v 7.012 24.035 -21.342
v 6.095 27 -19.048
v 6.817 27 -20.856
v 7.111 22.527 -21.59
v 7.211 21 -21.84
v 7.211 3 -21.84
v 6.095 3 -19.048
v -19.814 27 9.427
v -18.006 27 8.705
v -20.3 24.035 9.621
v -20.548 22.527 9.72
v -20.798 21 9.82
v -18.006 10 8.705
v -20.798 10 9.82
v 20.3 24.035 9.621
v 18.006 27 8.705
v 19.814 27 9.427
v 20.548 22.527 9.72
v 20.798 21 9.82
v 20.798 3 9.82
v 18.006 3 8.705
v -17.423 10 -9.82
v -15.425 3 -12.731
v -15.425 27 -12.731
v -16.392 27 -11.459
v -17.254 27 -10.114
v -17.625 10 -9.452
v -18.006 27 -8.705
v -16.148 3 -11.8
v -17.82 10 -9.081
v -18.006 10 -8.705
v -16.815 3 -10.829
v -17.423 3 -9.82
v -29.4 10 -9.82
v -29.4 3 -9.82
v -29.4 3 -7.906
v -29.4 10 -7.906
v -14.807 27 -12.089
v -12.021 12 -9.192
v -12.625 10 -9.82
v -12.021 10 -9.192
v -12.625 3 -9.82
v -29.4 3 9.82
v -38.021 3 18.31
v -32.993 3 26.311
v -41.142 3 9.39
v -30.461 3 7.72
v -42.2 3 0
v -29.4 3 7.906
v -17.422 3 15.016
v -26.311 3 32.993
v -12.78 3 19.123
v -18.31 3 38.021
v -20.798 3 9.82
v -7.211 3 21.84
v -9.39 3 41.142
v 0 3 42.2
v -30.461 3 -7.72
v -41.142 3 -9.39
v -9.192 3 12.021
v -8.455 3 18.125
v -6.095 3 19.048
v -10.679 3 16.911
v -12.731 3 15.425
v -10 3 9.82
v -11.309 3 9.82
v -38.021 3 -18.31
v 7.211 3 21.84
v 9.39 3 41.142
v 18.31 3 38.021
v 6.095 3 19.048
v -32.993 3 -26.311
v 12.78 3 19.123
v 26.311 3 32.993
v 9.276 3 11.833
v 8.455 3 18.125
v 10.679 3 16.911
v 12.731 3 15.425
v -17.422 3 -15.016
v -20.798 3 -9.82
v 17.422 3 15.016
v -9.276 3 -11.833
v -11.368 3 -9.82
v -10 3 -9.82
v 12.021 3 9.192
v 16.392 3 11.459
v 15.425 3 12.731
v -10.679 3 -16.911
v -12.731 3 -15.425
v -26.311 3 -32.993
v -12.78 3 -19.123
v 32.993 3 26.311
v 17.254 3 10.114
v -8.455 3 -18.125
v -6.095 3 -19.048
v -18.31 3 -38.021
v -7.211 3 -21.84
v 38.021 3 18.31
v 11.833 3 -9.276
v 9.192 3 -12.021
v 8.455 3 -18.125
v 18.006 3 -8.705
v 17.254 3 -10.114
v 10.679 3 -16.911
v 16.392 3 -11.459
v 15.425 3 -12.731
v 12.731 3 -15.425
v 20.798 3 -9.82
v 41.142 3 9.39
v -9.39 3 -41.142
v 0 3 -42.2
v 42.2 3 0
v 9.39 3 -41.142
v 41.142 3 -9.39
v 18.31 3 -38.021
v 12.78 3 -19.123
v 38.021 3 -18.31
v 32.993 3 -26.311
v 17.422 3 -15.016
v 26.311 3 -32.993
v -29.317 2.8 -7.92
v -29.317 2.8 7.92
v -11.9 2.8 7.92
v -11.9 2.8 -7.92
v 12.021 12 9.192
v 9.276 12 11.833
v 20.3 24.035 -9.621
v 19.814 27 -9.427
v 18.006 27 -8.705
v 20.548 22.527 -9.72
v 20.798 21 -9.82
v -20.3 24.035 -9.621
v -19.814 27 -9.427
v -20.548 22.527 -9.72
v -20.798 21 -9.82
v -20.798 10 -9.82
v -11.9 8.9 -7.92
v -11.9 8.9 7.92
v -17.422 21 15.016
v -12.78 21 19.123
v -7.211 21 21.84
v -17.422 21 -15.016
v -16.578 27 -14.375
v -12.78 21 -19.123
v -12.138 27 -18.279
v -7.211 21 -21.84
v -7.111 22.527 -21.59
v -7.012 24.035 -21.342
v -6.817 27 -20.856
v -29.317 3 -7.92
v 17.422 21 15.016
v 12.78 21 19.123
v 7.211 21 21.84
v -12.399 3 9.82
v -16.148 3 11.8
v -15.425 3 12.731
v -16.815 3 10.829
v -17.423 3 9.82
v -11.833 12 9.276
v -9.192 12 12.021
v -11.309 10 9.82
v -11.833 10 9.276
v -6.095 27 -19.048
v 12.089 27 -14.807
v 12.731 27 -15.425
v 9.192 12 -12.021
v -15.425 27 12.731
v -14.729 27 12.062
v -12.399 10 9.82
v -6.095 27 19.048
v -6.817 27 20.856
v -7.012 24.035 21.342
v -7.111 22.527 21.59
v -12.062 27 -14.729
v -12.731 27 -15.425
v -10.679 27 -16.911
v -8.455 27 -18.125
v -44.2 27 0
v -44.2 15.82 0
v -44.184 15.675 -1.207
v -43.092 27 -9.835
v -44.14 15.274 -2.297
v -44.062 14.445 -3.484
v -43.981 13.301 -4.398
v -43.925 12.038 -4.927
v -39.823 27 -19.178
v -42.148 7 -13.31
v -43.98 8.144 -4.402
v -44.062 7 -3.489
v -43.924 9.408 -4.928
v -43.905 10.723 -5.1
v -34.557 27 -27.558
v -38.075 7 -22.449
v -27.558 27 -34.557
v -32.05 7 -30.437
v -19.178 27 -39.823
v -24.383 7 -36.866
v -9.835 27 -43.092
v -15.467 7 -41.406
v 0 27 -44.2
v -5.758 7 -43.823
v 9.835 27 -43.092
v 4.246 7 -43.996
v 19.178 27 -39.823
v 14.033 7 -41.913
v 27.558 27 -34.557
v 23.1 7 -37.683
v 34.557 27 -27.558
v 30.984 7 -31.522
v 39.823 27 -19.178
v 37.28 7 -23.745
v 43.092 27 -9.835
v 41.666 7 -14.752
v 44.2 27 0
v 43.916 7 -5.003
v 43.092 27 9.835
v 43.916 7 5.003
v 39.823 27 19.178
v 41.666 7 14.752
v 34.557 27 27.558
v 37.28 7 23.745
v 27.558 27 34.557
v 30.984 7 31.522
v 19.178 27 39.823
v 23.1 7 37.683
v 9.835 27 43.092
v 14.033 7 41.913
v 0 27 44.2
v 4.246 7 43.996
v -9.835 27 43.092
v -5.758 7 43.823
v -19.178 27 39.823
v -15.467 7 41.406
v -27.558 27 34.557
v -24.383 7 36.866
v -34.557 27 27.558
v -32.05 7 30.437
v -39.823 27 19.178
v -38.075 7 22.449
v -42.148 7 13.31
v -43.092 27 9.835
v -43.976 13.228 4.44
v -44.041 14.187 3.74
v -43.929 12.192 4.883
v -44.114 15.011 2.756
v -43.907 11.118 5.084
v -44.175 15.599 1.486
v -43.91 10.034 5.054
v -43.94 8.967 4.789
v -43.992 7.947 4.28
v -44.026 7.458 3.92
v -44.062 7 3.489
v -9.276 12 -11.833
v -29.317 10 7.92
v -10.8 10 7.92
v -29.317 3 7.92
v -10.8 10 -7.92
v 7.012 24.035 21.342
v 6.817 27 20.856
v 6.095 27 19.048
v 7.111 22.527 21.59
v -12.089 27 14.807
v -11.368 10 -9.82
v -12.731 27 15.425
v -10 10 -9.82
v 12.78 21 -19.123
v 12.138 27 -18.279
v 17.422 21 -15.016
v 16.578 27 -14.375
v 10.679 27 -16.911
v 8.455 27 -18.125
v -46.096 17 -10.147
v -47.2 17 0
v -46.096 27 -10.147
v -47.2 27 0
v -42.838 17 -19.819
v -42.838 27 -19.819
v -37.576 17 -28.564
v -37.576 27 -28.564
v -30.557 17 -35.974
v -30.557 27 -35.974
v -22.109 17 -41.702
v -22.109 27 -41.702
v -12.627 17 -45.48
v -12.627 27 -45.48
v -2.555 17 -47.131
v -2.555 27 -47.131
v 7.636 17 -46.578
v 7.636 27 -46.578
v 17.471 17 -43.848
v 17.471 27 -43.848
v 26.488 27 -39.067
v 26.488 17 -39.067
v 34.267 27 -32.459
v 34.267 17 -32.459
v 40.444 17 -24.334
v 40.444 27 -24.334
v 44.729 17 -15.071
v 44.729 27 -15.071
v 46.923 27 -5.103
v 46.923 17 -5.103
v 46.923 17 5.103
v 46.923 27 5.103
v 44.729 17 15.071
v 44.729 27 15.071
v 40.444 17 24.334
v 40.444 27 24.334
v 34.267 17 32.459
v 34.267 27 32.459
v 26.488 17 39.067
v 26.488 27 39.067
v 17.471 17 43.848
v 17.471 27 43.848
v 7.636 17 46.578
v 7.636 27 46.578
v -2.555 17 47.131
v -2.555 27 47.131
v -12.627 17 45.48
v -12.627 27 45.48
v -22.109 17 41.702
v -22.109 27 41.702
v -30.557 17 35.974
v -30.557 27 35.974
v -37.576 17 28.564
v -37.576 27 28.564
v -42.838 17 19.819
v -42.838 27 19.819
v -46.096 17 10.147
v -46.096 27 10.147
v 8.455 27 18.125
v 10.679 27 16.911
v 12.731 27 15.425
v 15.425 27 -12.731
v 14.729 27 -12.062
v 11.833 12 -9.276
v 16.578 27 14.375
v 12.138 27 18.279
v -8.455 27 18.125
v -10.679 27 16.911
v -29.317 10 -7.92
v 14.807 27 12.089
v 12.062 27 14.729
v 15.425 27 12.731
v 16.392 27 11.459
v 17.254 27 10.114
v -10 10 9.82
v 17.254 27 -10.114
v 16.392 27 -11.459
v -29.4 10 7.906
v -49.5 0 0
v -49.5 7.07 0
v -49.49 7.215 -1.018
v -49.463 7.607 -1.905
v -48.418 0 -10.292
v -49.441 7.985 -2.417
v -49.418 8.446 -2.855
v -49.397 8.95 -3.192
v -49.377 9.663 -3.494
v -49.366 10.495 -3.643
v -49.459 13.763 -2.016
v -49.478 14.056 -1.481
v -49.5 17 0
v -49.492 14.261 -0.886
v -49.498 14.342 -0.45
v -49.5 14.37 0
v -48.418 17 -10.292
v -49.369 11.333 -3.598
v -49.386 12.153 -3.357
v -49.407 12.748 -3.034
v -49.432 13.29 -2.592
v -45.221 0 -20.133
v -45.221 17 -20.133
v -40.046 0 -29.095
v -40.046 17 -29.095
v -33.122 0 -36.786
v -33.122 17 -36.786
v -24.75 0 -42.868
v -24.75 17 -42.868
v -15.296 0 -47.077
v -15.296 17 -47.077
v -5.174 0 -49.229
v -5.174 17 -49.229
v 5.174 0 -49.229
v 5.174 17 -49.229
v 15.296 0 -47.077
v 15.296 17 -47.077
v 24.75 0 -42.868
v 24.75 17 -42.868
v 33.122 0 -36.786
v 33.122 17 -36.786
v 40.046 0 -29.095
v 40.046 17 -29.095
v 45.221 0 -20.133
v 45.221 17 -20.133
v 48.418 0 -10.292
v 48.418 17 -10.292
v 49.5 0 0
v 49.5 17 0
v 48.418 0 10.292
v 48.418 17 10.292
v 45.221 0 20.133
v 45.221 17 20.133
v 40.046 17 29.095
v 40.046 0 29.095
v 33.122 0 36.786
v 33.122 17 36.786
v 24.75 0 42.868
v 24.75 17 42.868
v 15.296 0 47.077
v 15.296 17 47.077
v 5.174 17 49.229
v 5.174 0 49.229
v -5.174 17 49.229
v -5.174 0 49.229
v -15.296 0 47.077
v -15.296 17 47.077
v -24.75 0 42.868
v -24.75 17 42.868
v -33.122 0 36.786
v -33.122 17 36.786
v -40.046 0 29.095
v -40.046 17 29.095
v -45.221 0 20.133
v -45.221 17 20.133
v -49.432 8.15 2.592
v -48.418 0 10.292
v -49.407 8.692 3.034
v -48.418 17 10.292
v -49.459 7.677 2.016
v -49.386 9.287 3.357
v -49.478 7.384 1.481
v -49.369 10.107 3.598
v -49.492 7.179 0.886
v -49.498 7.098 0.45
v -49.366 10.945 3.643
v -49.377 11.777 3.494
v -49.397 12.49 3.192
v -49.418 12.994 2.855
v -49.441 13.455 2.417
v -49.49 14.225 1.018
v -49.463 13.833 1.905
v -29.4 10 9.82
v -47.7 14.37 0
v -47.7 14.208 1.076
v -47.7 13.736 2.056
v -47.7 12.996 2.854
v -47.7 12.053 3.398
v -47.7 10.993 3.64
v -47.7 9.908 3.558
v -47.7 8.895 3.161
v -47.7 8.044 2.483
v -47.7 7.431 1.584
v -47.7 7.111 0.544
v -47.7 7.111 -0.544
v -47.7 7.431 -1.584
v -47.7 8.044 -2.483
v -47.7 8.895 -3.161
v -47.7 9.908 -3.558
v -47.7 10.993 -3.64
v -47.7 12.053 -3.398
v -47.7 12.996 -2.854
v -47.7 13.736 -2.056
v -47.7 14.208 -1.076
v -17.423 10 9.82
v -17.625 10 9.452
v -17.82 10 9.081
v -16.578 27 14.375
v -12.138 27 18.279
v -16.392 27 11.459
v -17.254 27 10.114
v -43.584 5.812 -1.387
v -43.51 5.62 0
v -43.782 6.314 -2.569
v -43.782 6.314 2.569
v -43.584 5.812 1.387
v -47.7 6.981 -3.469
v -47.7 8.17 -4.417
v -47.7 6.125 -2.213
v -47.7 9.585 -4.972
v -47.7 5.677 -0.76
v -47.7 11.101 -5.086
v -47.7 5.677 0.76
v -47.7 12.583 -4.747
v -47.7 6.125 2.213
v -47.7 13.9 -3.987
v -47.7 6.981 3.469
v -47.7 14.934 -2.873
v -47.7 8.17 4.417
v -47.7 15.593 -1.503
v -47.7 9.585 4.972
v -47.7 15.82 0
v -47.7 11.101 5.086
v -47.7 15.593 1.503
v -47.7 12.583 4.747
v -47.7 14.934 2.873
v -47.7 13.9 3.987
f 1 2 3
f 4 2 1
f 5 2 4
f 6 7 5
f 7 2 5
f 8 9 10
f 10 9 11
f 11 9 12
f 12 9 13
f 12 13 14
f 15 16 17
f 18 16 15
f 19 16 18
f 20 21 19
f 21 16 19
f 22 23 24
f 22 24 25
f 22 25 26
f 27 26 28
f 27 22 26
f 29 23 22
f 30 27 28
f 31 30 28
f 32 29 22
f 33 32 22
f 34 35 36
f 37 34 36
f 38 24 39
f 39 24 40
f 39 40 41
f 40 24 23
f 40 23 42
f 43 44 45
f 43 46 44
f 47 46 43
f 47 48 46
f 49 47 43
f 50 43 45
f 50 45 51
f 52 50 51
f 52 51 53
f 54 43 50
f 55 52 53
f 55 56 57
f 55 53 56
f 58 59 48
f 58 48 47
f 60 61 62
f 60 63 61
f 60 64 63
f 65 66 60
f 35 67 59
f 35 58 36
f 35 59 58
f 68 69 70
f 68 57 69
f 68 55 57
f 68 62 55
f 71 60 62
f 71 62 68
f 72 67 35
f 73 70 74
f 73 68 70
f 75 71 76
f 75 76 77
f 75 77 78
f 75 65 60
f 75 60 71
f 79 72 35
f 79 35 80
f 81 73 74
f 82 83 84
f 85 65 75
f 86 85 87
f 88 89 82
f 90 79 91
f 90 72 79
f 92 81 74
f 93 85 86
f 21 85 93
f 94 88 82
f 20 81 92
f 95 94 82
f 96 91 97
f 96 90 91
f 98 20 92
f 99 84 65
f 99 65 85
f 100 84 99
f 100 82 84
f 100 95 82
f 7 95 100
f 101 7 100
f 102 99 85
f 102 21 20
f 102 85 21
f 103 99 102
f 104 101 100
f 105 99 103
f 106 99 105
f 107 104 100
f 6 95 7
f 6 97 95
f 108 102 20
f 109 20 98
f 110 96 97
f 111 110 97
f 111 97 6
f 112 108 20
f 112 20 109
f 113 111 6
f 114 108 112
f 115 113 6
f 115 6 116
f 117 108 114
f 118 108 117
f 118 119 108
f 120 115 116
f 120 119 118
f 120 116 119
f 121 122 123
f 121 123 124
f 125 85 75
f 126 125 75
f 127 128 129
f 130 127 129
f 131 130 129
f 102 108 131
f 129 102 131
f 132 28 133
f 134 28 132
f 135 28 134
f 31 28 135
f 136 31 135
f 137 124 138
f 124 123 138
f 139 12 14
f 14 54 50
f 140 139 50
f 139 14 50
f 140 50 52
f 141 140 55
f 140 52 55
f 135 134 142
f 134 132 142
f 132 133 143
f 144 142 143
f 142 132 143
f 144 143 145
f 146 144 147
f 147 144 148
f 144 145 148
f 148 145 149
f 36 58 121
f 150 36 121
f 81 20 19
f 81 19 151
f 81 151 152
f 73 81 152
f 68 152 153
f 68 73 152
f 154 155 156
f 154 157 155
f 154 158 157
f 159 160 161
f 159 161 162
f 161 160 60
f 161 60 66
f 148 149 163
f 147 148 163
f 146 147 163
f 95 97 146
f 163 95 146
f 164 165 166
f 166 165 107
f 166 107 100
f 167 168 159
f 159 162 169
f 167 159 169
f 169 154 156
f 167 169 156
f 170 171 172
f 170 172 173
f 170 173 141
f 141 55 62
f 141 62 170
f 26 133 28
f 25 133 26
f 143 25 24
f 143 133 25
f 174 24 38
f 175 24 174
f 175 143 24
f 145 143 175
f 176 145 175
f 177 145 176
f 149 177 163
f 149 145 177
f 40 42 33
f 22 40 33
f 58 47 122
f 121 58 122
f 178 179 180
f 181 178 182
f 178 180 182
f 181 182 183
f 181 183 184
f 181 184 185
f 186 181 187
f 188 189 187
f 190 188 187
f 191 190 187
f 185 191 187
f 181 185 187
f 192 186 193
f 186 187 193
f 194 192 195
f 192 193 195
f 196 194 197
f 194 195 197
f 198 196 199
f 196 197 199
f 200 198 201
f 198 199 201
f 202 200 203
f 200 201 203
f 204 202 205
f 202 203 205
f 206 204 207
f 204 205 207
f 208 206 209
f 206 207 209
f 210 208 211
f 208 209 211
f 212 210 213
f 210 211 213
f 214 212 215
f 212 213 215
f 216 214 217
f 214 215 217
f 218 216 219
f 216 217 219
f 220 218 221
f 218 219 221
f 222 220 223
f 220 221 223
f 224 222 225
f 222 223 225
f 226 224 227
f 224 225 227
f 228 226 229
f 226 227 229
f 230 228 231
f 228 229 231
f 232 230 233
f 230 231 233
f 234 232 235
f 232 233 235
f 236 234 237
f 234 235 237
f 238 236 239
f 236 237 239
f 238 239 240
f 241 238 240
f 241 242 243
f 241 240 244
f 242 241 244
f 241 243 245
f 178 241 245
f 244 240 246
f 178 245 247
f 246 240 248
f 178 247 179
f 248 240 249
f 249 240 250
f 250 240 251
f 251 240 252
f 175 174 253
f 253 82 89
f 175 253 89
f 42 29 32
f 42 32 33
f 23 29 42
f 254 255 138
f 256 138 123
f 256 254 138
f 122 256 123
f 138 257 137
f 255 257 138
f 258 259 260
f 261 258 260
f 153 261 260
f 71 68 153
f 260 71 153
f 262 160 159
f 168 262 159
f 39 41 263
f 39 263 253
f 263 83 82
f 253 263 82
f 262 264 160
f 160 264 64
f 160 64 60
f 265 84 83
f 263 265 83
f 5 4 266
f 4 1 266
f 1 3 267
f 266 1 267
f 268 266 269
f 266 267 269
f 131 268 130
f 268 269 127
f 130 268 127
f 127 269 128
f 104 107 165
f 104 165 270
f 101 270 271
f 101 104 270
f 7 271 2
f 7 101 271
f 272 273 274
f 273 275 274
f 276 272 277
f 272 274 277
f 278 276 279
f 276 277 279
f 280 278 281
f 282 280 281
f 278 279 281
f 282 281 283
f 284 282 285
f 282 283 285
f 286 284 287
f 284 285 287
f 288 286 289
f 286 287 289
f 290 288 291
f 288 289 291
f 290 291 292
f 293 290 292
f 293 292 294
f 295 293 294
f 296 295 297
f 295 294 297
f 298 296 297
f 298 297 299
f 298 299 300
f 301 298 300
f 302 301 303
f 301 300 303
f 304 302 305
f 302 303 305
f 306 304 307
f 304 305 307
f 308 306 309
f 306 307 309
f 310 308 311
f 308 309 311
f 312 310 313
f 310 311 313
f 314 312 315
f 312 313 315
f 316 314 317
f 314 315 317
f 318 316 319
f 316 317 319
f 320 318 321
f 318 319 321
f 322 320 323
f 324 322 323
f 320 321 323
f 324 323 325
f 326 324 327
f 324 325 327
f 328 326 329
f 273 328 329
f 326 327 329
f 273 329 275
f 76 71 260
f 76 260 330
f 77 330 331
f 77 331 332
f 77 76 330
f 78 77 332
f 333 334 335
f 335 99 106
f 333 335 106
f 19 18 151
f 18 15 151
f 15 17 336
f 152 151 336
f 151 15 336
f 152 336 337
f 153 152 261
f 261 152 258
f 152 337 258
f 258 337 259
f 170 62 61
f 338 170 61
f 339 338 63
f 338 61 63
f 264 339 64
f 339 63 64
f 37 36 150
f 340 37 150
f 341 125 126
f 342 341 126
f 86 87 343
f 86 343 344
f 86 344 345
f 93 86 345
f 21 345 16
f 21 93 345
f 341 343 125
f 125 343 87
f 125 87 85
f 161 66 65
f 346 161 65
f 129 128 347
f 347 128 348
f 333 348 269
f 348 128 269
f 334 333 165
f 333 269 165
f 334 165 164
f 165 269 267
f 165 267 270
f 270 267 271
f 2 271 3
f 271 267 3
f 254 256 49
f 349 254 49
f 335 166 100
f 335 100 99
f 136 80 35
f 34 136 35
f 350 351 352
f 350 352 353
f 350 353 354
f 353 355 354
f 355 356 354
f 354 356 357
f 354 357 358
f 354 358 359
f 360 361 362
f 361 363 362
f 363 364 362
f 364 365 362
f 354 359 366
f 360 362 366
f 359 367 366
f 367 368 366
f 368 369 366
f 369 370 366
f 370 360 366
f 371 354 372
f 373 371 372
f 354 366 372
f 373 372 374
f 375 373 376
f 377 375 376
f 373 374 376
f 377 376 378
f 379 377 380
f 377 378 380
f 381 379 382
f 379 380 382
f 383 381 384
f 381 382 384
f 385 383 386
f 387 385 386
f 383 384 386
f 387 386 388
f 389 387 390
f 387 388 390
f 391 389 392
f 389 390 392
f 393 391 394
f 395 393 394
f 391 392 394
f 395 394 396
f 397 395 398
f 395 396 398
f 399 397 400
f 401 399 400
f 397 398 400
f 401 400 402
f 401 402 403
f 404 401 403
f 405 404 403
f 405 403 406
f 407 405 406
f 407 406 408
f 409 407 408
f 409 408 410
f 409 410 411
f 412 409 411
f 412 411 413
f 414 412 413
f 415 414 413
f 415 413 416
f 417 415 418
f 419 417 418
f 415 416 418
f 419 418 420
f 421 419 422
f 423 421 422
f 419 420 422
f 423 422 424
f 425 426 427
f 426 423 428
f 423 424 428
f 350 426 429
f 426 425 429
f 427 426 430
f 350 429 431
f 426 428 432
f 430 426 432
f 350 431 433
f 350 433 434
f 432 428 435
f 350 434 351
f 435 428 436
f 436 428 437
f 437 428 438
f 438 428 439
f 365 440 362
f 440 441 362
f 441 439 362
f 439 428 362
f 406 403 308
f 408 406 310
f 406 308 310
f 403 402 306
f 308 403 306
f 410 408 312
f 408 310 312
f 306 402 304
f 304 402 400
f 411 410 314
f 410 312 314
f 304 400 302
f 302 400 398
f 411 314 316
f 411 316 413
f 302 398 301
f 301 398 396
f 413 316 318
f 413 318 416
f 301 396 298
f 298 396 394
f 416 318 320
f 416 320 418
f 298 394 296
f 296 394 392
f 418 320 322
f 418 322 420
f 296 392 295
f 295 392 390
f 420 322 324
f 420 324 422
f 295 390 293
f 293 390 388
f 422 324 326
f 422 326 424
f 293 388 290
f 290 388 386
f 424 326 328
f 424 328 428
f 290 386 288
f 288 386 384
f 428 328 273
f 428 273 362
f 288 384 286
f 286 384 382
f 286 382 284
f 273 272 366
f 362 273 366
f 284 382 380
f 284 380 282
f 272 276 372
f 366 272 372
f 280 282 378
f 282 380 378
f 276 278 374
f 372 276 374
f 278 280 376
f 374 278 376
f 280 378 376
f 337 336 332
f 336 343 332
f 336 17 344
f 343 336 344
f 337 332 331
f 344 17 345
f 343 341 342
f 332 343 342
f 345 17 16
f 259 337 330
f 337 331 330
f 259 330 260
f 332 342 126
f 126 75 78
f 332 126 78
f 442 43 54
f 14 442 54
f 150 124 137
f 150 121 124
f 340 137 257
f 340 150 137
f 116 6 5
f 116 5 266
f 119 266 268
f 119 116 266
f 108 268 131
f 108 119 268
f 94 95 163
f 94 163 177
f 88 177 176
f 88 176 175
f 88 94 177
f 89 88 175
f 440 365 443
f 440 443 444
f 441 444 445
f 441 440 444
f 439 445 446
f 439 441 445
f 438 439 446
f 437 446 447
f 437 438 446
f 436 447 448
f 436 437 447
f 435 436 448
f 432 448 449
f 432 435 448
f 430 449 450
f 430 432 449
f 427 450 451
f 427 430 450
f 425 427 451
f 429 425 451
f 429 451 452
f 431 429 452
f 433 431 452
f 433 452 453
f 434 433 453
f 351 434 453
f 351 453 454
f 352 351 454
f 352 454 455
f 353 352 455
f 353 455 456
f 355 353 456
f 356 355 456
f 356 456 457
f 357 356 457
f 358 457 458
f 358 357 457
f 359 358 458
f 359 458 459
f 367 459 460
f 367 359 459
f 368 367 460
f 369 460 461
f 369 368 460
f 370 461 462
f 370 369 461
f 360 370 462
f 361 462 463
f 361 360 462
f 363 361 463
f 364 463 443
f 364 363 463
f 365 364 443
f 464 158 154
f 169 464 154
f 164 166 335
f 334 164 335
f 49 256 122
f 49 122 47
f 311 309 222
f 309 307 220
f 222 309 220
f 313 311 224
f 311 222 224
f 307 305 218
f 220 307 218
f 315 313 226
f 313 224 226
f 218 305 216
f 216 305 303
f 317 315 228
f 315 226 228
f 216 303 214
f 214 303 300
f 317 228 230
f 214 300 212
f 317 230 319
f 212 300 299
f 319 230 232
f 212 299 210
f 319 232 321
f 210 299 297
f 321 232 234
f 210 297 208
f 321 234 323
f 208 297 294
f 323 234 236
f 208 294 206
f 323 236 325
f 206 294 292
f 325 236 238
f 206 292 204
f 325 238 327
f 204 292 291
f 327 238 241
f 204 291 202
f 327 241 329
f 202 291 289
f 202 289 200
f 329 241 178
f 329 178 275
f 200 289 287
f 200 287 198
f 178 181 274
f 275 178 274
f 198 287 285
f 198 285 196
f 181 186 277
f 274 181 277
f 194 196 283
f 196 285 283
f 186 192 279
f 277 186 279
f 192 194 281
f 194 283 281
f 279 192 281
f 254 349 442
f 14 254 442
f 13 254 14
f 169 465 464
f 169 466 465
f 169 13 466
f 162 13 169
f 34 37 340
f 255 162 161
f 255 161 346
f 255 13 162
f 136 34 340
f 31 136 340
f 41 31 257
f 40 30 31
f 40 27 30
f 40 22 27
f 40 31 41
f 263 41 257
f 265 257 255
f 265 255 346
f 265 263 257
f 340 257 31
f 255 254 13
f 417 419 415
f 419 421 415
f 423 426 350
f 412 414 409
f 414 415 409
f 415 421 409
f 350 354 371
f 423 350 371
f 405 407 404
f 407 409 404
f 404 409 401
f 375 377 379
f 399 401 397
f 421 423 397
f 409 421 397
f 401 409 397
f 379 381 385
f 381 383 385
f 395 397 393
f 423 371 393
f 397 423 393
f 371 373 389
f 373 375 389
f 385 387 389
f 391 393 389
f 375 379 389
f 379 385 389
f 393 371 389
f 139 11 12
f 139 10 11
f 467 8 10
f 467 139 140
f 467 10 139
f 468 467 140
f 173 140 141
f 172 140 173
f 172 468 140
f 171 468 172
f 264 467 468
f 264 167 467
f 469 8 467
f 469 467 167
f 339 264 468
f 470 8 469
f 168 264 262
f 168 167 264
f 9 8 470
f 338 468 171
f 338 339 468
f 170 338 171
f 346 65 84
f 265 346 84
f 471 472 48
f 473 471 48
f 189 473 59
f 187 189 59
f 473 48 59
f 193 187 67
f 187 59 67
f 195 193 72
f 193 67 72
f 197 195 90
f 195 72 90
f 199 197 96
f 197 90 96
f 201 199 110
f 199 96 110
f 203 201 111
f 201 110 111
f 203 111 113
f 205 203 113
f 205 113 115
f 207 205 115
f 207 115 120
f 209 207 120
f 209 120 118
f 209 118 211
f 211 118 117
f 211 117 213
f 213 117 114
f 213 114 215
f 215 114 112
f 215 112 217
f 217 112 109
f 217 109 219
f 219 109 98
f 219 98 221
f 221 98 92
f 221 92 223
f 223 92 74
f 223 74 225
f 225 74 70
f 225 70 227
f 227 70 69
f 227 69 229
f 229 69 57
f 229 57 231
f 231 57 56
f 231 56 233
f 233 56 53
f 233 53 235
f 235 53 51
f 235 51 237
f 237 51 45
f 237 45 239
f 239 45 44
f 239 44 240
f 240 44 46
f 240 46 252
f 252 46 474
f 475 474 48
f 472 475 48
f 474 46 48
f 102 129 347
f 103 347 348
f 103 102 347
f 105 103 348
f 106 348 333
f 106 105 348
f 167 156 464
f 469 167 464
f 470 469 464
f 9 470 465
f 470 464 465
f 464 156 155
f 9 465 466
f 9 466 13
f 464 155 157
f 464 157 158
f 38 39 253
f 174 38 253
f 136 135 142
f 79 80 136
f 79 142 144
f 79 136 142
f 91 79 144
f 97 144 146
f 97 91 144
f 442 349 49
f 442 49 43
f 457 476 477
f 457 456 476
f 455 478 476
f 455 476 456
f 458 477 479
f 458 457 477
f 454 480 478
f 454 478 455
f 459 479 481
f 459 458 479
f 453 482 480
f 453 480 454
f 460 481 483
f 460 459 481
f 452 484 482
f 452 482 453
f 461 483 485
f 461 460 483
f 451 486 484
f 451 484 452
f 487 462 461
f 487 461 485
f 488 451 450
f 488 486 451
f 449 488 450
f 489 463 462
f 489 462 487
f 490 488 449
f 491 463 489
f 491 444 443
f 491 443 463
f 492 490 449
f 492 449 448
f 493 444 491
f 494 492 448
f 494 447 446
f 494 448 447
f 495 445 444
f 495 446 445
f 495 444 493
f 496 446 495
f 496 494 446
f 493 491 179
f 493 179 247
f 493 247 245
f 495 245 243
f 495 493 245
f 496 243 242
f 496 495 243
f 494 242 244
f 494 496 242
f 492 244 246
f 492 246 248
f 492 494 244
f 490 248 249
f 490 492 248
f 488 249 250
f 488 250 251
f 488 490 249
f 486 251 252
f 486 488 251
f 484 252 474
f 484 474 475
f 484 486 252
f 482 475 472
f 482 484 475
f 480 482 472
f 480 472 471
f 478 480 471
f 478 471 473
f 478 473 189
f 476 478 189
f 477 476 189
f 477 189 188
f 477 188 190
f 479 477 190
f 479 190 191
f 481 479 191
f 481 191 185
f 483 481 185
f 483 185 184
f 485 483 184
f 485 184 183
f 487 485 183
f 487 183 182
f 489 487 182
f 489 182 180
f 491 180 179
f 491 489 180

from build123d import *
from OCP.BRepFilletAPI import BRepFilletAPI_MakeChamfer

# Parameters (mm, degrees)
EXTRUDE_1_DEPTH     = 7
OTHER_START         = -47.7
OTHER_1_OUTLINE_R   = 5.1
OTHER_1_DEPTH       = 35.8
OTHER_START_2       = -30.461492928
OTHER_1_2_DEPTH     = 18.561492928
OTHER_START_3       = -51
OTHER_1_3_OUTLINE_R = 3.65
OTHER_1_3_DEPTH     = 3.3
OTHER_START_4       = 2
OTHER_1_4_DEPTH     = 1
OTHER_START_5       = 2.8
OTHER_1_5_DEPTH     = 7.2
OTHER_START_6       = -3
OTHER_1_6_DEPTH     = 0.709959236
EXTRUDE_2_DEPTH     = 24
EXTRUDE_2_2_DEPTH   = 24
EXTRUDE_2_3_DEPTH   = 24
EXTRUDE_2_4_DEPTH   = 24
CHAMFER_1_SIZE      = 6
CHAMFER_1_SIZE2     = 1.057961884
CHAMFER_2_SIZE      = 6
CHAMFER_2_SIZE2     = 1.057961884
CHAMFER_3_SIZE      = 6
CHAMFER_3_SIZE2     = 1.057961884
CHAMFER_4_SIZE      = 6
CHAMFER_4_SIZE2     = 1.057961884
CHAMFER_5_SIZE      = 1.1
EXTRUDE_3_DEPTH     = 24
CHAMFER_6_SIZE      = 15
CHAMFER_6_SIZE2     = 4.019237886


with BuildPart() as part:
    # Эскиз1 → Повернуть1 (revolve)
    with BuildSketch(Plane.XY):
        Polygon((0, 0), (-49.5, 0), (-49.5, 17), (-47.2, 17), (-47.2, 27), (-44.2, 27), (-44.2, 7), (-42.2, 3), (0, 3), align=None)
    revolve(axis=Axis((0, 3, 0), (0, -1, 0)))

    # Эскиз2 → Бобышка-Вытянуть1 (add)
    with BuildSketch(Plane(origin=(0, 3, 0), x_dir=(1, 0, 0), z_dir=(0, 1, 0))):
        Polygon((-10, -9.82), (-10, 9.82), (-29.4, 9.82), (-29.4, 7.82), (-12, 7.82), (-12, -7.82), (-29.4, -7.82), (-29.4, -9.82), align=None)
    extrude(amount=EXTRUDE_1_DEPTH)

    # Отступ1: read off the stored shape, not the designer's step
    # Отступ1 outline → Отступ1 (cut)
    with BuildSketch(Plane.YZ.offset(OTHER_START)):
        with Locations((10.72, 0)):
            Circle(OTHER_1_OUTLINE_R)
    extrude(amount=OTHER_1_DEPTH, mode=Mode.SUBTRACT)

    # Other 1 2 outline → Other 1 2 (cut)
    with BuildSketch(Plane.YZ.offset(OTHER_START_2)):
        with BuildLine():
            Line((2.8, 7.92), (2.8, -7.92))
            Line((2.8, -7.92), (10, -7.92))
            Line((10, -7.92), (10, -5.048920677))
            ThreePointArc((10, -5.048920677), (5.62, 0), (10, 5.048920677))
            Line((10, 5.048920677), (10, 7.92))
            Line((10, 7.92), (2.8, 7.92))
        make_face()
    extrude(amount=OTHER_1_2_DEPTH, mode=Mode.SUBTRACT)

    # Other 1 3 outline → Other 1 3 (cut)
    with BuildSketch(Plane.YZ.offset(OTHER_START_3)):
        with Locations((10.72, 0)):
            Circle(OTHER_1_3_OUTLINE_R)
    extrude(amount=OTHER_1_3_DEPTH, mode=Mode.SUBTRACT)

    # Other 1 4 outline → Other 1 4 (add)
    with BuildSketch(Plane(origin=(0, 0, 0), x_dir=(1, 0, 0), z_dir=(0, 1, 0)).offset(OTHER_START_4)):
        Polygon((-30.461492928, -7.72), (-30.461492928, -7.92), (-29.317348784, -7.92), align=None)
        Polygon((-30.461492928, 7.92), (-30.461492928, 7.72), (-29.317348784, 7.92), align=None)
    extrude(amount=OTHER_1_4_DEPTH)

    # Other 1 5 outline → Other 1 5 (add)
    with BuildSketch(Plane(origin=(0, 0, 0), x_dir=(1, 0, 0), z_dir=(0, 1, 0)).offset(OTHER_START_5)):
        Polygon((-29.317348784, -7.92), (-29.4, -7.905552307), (-29.4, -7.92), align=None)
        Polygon((-29.4, 7.92), (-29.4, 7.905552307), (-29.317348784, 7.92), align=None)
    extrude(amount=OTHER_1_5_DEPTH)

    # Other 1 6 outline → Other 1 6 (add)
    with BuildSketch(Plane(origin=(0, 0, 0), x_dir=(0.9850633751005737, -0.17219218052939098, 0), z_dir=(0.17219218052939098, 0.9850633751005737, 0)).offset(OTHER_START_6)):
        Polygon((-29.361584648, 7.92), (-30.523077576, 7.72), (-30.523077576, -7.72), (-29.361584648, -7.92), align=None)
    extrude(amount=OTHER_1_6_DEPTH)

    # Фаска5
    chamfer_5_edges = [part.edges().sort_by_distance(p)[0] for p in [
        (-11.9, 10, 0),
    ]]
    chamfer(chamfer_5_edges, length=CHAMFER_5_SIZE)



with BuildPart() as body_2:
    # Эскиз4 → Бобышка-Вытянуть2 (new body)
    with BuildSketch(Plane(origin=(0, 3, 0), x_dir=(1, 0, 0), z_dir=(0, 1, 0))):
        with BuildLine():
            Line((-18.006273941, 8.704831921), (-20.798259543, 9.82))
            ThreePointArc((-20.798259543, 9.82), (-15.239680095, 17.226495598), (-7.210659701, 21.84047588))
            Line((-7.210659701, 21.84047588), (-6.095491622, 19.048490278))
            ThreePointArc((-6.095491622, 19.048490278), (-13.113793992, 15.100609496), (-18.006273941, 8.704831921))
        make_face()
    extrude(amount=EXTRUDE_2_DEPTH)

    # Фаска4
    chamfer_4_edges = [body_2.edges().sort_by_distance(p)[0] for p in [
        (-15.239680095, 27, -17.226495598),
    ]]
    chamfer_4_side = [body_2.faces().sort_by_distance(p)[0] for p in [
        (-15.239680095, 15, -17.226495598),
    ]]
    chamfer(chamfer_4_edges, length=CHAMFER_4_SIZE, length2=CHAMFER_4_SIZE2, reference=chamfer_4_side[0])


with BuildPart() as body_3:
    # Эскиз4 → Extrude 2 2 (new body)
    with BuildSketch(Plane(origin=(0, 3, 0), x_dir=(1, 0, 0), z_dir=(0, 1, 0))):
        with BuildLine():
            Line((-18.006273941, -8.704831921), (-20.798259543, -9.82))
            ThreePointArc((-20.798259543, -9.82), (-15.239680095, -17.226495598), (-7.210659701, -21.84047588))
            Line((-7.210659701, -21.84047588), (-6.095491622, -19.048490278))
            ThreePointArc((-6.095491622, -19.048490278), (-13.113793992, -15.100609496), (-18.006273941, -8.704831921))
        make_face()
    extrude(amount=EXTRUDE_2_2_DEPTH)

    # Фаска1
    chamfer_1_edges = [body_3.edges().sort_by_distance(p)[0] for p in [
        (-15.239680095, 27, 17.226495598),
    ]]
    chamfer_1_side = [body_3.faces().sort_by_distance(p)[0] for p in [
        (-15.239680095, 15, 17.226495598),
    ]]
    chamfer(chamfer_1_edges, length=CHAMFER_1_SIZE, length2=CHAMFER_1_SIZE2, reference=chamfer_1_side[0])


with BuildPart() as body_4:
    # Эскиз4 → Extrude 2 3 (new body)
    with BuildSketch(Plane(origin=(0, 3, 0), x_dir=(1, 0, 0), z_dir=(0, 1, 0))):
        with BuildLine():
            Line((6.095491622, 19.048490278), (7.210659701, 21.84047588))
            ThreePointArc((7.210659701, 21.84047588), (15.239680095, 17.226495598), (20.798259543, 9.82))
            Line((20.798259543, 9.82), (18.006273941, 8.704831921))
            ThreePointArc((18.006273941, 8.704831921), (13.113793992, 15.100609496), (6.095491622, 19.048490278))
        make_face()
    extrude(amount=EXTRUDE_2_3_DEPTH)

    # Фаска3
    chamfer_3_edges = [body_4.edges().sort_by_distance(p)[0] for p in [
        (15.239680095, 27, -17.226495598),
    ]]
    chamfer_3_side = [body_4.faces().sort_by_distance(p)[0] for p in [
        (15.239680095, 15, -17.226495598),
    ]]
    chamfer(chamfer_3_edges, length=CHAMFER_3_SIZE, length2=CHAMFER_3_SIZE2, reference=chamfer_3_side[0])


with BuildPart() as body_5:
    # Эскиз4 → Extrude 2 4 (new body)
    with BuildSketch(Plane(origin=(0, 3, 0), x_dir=(1, 0, 0), z_dir=(0, 1, 0))):
        with BuildLine():
            Line((18.006273941, -8.704831921), (20.798259543, -9.82))
            ThreePointArc((20.798259543, -9.82), (15.239680095, -17.226495598), (7.210659701, -21.84047588))
            Line((7.210659701, -21.84047588), (6.095491622, -19.048490278))
            ThreePointArc((6.095491622, -19.048490278), (13.113793992, -15.100609496), (18.006273941, -8.704831921))
        make_face()
    extrude(amount=EXTRUDE_2_4_DEPTH)

    # Фаска2
    chamfer_2_edges = [body_5.edges().sort_by_distance(p)[0] for p in [
        (15.239680095, 27, 17.226495598),
    ]]
    chamfer_2_side = [body_5.faces().sort_by_distance(p)[0] for p in [
        (15.239680095, 15, 17.226495598),
    ]]
    chamfer(chamfer_2_edges, length=CHAMFER_2_SIZE, length2=CHAMFER_2_SIZE2, reference=chamfer_2_side[0])


with BuildPart() as part_1:
    add(part.part)

    add(body_2.part)  # Бобышка-Вытянуть3 merges body 2

    add(body_3.part)  # Бобышка-Вытянуть3 merges body 3

    add(body_4.part)  # Бобышка-Вытянуть3 merges body 4

    add(body_5.part)  # Бобышка-Вытянуть3 merges body 5
    # Эскиз5 → Бобышка-Вытянуть3 (add)
    with BuildSketch(Plane(origin=(0, 3, 0), x_dir=(1, 0, 0), z_dir=(0, 1, 0))):
        with BuildLine():
            Line((-9.275848781, 11.832874951), (-12.730982797, 15.424722916))
            ThreePointArc((-12.730982797, 15.424722916), (-14.142135624, 14.142135624), (-15.424722916, 12.730982797))
            Line((-15.424722916, 12.730982797), (-12.02081528, 9.192388155))
            Line((-12.02081528, 9.192388155), (-9.275848781, 11.832874951))
        make_face()
        with BuildLine():
            ThreePointArc((15.424722916, 12.730982797), (14.142135624, 14.142135624), (12.730982797, 15.424722916))
            Line((12.730982797, 15.424722916), (9.192388155, 12.02081528))
            Line((9.192388155, 12.02081528), (11.832874951, 9.275848781))
            Line((11.832874951, 9.275848781), (15.424722916, 12.730982797))
        make_face()
        with BuildLine():
            ThreePointArc((12.730982797, -15.424722916), (14.142135624, -14.142135624), (15.424722916, -12.730982797))
            Line((15.424722916, -12.730982797), (12.02081528, -9.192388155))
            Line((12.02081528, -9.192388155), (9.275848781, -11.832874951))
            Line((9.275848781, -11.832874951), (12.730982797, -15.424722916))
        make_face()
        with BuildLine():
            ThreePointArc((-15.424722916, -12.730982797), (-14.142135624, -14.142135624), (-12.730982797, -15.424722916))
            Line((-12.730982797, -15.424722916), (-9.192388155, -12.02081528))
            Line((-9.192388155, -12.02081528), (-11.832874951, -9.275848781))
            Line((-11.832874951, -9.275848781), (-15.424722916, -12.730982797))
        make_face()
    extrude(amount=EXTRUDE_3_DEPTH)

    # Фаска6: one chamfer whose edges measure the first distance from different faces: ONE call of the kernel's chamfer builder (chamfer() names one face for all edges)
    chamfer_6_edges_1 = [part_1.edges().sort_by_distance(p)[0] for p in [
        (-10.648332031, 27, -10.512631553),
    ]]
    chamfer_6_side_1 = [part_1.faces().sort_by_distance(p)[0] for p in [
        (-10.570396404, 15.633162389, -10.587600771),
    ]]
    chamfer_6_edges_2 = [part_1.edges().sort_by_distance(p)[0] for p in [
        (10.512631553, 27, -10.648332031),
    ]]
    chamfer_6_side_2 = [part_1.faces().sort_by_distance(p)[0] for p in [
        (10.512631553, 15, -10.648332031),
    ]]
    chamfer_6_edges_3 = [part_1.edges().sort_by_distance(p)[0] for p in [
        (10.648332031, 27, 10.512631553),
    ]]
    chamfer_6_side_3 = [part_1.faces().sort_by_distance(p)[0] for p in [
        (10.648332031, 15, 10.512631553),
    ]]
    chamfer_6_edges_4 = [part_1.edges().sort_by_distance(p)[0] for p in [
        (-10.512631553, 27, 10.648332031),
    ]]
    chamfer_6_side_4 = [part_1.faces().sort_by_distance(p)[0] for p in [
        (-10.447673128, 15.521619556, 10.715860754),
    ]]
    chamfer_6 = BRepFilletAPI_MakeChamfer(part_1.part.solid().wrapped)
    for e in chamfer_6_edges_1:
        chamfer_6.Add(CHAMFER_6_SIZE, CHAMFER_6_SIZE2, e.wrapped, chamfer_6_side_1[0].wrapped)  # the first distance lies on this face
    for e in chamfer_6_edges_2:
        chamfer_6.Add(CHAMFER_6_SIZE, CHAMFER_6_SIZE2, e.wrapped, chamfer_6_side_2[0].wrapped)  # the first distance lies on this face
    for e in chamfer_6_edges_3:
        chamfer_6.Add(CHAMFER_6_SIZE, CHAMFER_6_SIZE2, e.wrapped, chamfer_6_side_3[0].wrapped)  # the first distance lies on this face
    for e in chamfer_6_edges_4:
        chamfer_6.Add(CHAMFER_6_SIZE, CHAMFER_6_SIZE2, e.wrapped, chamfer_6_side_4[0].wrapped)  # the first distance lies on this face
    add(Compound.cast(chamfer_6.Shape()), mode=Mode.REPLACE)


solid = part_1.part
